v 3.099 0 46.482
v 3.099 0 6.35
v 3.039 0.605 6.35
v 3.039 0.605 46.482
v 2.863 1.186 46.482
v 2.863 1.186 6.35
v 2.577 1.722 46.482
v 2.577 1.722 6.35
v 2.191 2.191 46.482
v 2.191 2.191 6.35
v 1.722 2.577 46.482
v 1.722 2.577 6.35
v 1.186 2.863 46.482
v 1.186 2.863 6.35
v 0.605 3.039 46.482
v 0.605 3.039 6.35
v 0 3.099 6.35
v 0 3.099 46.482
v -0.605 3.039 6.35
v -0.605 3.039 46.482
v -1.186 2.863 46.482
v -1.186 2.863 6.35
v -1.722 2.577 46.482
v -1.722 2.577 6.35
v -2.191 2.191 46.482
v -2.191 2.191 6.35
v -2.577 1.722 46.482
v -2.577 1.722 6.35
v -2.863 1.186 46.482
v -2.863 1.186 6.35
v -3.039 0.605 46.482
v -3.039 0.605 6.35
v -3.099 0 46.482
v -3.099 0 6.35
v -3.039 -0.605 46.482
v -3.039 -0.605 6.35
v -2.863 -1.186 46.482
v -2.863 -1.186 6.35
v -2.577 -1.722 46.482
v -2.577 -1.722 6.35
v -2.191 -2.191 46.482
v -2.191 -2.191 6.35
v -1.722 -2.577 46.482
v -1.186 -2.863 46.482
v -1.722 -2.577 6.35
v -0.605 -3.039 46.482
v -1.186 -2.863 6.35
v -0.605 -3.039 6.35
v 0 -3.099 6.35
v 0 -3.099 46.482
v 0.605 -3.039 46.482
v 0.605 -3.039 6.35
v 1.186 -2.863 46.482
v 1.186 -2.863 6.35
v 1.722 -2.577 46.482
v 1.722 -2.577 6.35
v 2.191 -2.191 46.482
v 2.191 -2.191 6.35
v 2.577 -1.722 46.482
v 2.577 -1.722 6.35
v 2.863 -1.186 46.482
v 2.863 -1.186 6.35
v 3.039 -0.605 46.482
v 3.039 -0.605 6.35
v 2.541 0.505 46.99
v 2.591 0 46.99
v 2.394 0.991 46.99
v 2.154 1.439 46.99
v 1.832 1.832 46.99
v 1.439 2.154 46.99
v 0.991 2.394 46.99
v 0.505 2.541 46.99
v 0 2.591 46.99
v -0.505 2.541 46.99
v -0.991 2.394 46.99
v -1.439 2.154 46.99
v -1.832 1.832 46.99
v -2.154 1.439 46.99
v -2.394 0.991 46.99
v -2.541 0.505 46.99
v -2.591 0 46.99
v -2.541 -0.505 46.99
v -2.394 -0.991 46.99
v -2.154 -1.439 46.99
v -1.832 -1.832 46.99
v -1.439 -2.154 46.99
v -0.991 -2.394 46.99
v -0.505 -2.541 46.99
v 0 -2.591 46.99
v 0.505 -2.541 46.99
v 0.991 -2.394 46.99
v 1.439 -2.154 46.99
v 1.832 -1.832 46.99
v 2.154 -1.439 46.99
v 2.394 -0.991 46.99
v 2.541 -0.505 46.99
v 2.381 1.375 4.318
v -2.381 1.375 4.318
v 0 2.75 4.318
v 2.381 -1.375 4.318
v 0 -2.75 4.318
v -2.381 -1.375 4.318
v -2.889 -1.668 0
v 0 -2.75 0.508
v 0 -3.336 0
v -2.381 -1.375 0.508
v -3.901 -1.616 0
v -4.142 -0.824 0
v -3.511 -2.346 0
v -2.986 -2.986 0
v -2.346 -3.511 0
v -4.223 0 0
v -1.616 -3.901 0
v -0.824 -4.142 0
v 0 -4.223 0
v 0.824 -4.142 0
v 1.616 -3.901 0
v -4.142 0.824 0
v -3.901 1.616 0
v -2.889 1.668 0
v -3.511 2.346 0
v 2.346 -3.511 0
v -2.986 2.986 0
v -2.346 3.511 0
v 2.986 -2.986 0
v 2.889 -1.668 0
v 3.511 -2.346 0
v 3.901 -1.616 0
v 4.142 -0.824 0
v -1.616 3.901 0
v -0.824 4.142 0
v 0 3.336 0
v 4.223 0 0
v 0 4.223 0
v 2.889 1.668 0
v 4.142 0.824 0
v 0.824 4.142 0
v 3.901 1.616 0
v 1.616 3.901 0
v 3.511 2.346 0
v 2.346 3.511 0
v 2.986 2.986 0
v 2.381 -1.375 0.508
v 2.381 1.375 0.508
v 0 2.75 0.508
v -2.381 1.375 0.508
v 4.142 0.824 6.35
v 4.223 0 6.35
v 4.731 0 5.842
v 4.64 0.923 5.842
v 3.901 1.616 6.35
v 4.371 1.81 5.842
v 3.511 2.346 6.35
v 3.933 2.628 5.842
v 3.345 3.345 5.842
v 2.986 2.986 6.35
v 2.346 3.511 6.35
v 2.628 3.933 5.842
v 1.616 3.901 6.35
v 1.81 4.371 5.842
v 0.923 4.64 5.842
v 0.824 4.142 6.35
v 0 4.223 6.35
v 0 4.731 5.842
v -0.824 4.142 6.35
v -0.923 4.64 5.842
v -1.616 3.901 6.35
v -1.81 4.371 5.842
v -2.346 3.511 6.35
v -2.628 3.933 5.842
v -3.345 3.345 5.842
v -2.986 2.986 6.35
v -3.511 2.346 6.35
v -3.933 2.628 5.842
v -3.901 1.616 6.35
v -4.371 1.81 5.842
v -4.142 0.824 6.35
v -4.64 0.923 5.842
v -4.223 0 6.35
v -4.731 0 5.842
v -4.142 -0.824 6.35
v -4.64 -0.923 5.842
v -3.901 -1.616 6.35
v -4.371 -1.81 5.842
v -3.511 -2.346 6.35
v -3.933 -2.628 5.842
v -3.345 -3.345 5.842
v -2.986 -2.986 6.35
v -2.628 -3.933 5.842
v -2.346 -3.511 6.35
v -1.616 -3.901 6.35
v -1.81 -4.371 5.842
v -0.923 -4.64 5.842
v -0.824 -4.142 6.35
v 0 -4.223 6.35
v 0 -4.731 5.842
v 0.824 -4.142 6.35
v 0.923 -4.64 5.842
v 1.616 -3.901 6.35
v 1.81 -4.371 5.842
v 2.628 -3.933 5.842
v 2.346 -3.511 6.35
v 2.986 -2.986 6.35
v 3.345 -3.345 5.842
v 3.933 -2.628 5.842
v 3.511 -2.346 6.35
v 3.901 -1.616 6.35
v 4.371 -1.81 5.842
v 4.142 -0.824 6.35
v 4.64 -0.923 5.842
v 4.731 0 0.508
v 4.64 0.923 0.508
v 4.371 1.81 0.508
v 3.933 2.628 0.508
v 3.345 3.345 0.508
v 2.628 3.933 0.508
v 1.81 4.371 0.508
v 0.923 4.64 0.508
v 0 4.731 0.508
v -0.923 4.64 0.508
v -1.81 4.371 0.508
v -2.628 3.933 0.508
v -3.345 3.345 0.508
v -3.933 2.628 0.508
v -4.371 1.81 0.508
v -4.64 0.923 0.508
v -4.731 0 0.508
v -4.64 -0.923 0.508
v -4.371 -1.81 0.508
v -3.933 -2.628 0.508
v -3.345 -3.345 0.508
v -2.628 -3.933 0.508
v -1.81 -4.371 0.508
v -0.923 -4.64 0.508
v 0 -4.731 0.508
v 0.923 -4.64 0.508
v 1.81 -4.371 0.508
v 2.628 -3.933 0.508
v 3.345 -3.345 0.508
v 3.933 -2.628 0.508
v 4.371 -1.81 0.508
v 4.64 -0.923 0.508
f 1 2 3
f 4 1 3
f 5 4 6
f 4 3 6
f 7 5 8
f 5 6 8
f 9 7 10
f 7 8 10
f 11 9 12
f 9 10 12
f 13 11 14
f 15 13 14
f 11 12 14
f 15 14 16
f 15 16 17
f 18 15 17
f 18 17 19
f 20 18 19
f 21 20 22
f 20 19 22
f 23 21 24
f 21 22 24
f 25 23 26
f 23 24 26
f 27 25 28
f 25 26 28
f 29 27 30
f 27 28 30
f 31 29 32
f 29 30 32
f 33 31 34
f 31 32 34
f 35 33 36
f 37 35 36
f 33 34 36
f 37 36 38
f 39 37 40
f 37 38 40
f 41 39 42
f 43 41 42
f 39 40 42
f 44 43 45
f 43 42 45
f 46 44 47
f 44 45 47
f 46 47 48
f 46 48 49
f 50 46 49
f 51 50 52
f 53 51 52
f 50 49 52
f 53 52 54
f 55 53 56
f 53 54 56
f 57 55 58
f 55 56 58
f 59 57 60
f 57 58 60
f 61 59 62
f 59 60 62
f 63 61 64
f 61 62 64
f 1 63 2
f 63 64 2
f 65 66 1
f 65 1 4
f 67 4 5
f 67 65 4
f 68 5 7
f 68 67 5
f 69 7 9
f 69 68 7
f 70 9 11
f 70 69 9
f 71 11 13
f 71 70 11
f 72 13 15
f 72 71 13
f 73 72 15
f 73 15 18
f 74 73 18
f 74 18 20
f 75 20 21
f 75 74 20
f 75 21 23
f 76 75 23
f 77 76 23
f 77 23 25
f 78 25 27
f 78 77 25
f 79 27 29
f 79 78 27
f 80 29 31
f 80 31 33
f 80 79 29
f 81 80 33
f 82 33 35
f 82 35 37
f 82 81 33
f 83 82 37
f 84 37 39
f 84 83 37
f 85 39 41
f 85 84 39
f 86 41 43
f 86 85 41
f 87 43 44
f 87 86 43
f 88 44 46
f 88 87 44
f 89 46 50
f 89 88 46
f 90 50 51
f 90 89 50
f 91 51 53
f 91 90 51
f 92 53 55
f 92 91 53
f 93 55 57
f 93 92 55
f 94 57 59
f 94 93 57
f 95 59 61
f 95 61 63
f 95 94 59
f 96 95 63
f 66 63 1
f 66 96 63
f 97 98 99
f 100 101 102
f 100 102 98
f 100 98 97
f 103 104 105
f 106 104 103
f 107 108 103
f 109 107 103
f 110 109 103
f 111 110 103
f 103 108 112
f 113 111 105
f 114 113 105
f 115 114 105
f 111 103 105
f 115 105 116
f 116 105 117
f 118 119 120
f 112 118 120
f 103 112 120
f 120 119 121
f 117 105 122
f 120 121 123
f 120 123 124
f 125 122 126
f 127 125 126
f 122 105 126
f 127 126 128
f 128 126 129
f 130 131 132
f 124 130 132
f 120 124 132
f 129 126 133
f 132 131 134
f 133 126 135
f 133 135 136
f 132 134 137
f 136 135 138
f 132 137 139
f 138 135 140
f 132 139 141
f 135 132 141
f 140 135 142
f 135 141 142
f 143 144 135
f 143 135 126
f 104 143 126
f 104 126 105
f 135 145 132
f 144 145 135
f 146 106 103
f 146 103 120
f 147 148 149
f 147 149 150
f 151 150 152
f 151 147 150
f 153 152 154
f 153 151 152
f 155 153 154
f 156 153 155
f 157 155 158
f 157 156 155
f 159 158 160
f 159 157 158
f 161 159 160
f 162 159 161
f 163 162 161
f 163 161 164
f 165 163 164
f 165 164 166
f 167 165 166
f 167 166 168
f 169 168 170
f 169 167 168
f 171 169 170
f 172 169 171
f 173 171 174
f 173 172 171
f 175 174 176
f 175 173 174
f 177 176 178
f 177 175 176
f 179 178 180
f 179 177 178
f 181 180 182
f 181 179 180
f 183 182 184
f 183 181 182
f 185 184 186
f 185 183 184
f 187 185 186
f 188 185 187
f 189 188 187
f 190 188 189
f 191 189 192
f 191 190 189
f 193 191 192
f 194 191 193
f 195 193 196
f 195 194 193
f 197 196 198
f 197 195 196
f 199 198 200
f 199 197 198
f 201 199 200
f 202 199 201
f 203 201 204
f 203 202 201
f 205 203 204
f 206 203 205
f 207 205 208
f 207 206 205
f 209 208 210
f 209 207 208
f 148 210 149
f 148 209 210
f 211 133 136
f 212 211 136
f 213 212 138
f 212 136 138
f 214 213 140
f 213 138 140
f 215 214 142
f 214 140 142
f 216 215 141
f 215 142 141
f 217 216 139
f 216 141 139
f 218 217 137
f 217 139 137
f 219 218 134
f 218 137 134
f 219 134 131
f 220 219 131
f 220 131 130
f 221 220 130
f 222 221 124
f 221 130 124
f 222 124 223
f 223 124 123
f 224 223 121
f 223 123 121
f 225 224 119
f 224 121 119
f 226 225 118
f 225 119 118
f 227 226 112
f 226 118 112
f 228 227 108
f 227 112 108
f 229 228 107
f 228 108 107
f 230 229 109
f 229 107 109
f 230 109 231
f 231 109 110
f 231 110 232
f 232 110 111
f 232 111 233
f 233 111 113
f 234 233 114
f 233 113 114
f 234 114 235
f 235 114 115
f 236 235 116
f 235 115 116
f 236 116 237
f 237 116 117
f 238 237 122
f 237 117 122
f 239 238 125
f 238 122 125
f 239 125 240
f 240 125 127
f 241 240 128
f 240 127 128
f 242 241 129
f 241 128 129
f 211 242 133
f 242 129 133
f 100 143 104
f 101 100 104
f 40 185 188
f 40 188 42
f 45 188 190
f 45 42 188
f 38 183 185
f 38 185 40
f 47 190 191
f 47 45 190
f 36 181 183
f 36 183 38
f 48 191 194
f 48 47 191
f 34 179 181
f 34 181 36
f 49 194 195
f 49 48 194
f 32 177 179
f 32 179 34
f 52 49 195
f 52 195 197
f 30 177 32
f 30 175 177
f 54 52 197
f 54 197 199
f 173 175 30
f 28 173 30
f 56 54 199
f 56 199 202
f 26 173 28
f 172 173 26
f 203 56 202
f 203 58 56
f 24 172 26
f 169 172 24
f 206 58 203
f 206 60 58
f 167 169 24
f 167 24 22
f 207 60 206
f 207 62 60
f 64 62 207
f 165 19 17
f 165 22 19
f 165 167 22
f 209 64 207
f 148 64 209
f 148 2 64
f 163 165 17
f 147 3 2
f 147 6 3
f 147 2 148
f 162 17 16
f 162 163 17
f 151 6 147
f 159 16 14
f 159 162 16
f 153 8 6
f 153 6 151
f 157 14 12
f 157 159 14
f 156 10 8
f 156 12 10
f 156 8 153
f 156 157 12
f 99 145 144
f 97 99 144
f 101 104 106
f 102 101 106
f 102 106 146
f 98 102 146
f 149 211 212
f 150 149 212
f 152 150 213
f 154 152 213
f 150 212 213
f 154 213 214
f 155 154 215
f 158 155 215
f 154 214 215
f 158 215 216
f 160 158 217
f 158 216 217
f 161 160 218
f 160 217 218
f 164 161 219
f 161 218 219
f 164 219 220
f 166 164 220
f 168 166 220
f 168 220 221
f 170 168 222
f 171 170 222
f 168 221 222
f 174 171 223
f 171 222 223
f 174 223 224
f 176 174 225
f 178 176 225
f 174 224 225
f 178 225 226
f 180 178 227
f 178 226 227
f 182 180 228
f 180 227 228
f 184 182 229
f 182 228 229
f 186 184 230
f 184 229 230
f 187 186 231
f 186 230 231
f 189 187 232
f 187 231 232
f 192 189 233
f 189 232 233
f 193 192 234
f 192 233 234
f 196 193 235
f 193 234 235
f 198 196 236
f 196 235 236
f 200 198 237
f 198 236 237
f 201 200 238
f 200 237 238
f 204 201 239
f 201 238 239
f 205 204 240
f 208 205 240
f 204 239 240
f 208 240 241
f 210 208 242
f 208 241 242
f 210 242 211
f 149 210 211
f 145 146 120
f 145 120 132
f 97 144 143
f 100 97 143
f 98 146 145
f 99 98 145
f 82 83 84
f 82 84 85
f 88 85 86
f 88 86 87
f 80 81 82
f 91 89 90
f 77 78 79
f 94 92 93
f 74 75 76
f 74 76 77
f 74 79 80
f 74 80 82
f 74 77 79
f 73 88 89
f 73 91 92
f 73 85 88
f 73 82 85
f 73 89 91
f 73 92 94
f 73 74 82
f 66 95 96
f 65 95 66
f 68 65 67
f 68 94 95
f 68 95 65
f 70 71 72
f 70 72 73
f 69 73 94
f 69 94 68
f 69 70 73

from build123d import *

# Parameters (mm, degrees)
F0_R     = 4.73075
F1_DEPTH = 6.35
F2_R     = 3.0988
F3_DEPTH = 40.64
F5_DEPTH = 4.318
F6_SIZE  = 0.508


with BuildPart() as f1:
    # F0 (on Top) → F1 (new body)
    with BuildSketch(Plane.XY):
        Circle(F0_R)
    extrude(amount=F1_DEPTH)

    # F2 (on face) → F3 (join)
    with BuildSketch(Plane.XY.offset(6.35)):
        Circle(F2_R)
    extrude(amount=F3_DEPTH)

    # F4 (on face) → F5 (cut)
    with BuildSketch(Plane(origin=(0, 0, 0), x_dir=(1, 0, 0), z_dir=(0, 0, -1))):
        Polygon((2.38125, -1.374815), (2.38125, 1.374815), (0, 2.749631), (-2.38125, 1.374815), (-2.38125, -1.374815), (0, -2.749631), align=None)
    extrude(amount=-F5_DEPTH, mode=Mode.SUBTRACT)

    # F6
    f6_edges = [f1.edges().sort_by_distance(p)[0] for p in [
        (1.190625, 2.062223, 0),
        (2.38125, 0, 0),
        (1.190625, -2.062223, 0),
        (-1.190625, -2.062223, 0),
        (-2.38125, 0, 0),
        (-1.190625, 2.062223, 0),
        (-4.73075, 0, 0),
        (-4.73075, 0, 6.35),
        (-3.0988, 0, 46.99),
    ]]
    chamfer(f6_edges, length=F6_SIZE)


solid = f1.part
